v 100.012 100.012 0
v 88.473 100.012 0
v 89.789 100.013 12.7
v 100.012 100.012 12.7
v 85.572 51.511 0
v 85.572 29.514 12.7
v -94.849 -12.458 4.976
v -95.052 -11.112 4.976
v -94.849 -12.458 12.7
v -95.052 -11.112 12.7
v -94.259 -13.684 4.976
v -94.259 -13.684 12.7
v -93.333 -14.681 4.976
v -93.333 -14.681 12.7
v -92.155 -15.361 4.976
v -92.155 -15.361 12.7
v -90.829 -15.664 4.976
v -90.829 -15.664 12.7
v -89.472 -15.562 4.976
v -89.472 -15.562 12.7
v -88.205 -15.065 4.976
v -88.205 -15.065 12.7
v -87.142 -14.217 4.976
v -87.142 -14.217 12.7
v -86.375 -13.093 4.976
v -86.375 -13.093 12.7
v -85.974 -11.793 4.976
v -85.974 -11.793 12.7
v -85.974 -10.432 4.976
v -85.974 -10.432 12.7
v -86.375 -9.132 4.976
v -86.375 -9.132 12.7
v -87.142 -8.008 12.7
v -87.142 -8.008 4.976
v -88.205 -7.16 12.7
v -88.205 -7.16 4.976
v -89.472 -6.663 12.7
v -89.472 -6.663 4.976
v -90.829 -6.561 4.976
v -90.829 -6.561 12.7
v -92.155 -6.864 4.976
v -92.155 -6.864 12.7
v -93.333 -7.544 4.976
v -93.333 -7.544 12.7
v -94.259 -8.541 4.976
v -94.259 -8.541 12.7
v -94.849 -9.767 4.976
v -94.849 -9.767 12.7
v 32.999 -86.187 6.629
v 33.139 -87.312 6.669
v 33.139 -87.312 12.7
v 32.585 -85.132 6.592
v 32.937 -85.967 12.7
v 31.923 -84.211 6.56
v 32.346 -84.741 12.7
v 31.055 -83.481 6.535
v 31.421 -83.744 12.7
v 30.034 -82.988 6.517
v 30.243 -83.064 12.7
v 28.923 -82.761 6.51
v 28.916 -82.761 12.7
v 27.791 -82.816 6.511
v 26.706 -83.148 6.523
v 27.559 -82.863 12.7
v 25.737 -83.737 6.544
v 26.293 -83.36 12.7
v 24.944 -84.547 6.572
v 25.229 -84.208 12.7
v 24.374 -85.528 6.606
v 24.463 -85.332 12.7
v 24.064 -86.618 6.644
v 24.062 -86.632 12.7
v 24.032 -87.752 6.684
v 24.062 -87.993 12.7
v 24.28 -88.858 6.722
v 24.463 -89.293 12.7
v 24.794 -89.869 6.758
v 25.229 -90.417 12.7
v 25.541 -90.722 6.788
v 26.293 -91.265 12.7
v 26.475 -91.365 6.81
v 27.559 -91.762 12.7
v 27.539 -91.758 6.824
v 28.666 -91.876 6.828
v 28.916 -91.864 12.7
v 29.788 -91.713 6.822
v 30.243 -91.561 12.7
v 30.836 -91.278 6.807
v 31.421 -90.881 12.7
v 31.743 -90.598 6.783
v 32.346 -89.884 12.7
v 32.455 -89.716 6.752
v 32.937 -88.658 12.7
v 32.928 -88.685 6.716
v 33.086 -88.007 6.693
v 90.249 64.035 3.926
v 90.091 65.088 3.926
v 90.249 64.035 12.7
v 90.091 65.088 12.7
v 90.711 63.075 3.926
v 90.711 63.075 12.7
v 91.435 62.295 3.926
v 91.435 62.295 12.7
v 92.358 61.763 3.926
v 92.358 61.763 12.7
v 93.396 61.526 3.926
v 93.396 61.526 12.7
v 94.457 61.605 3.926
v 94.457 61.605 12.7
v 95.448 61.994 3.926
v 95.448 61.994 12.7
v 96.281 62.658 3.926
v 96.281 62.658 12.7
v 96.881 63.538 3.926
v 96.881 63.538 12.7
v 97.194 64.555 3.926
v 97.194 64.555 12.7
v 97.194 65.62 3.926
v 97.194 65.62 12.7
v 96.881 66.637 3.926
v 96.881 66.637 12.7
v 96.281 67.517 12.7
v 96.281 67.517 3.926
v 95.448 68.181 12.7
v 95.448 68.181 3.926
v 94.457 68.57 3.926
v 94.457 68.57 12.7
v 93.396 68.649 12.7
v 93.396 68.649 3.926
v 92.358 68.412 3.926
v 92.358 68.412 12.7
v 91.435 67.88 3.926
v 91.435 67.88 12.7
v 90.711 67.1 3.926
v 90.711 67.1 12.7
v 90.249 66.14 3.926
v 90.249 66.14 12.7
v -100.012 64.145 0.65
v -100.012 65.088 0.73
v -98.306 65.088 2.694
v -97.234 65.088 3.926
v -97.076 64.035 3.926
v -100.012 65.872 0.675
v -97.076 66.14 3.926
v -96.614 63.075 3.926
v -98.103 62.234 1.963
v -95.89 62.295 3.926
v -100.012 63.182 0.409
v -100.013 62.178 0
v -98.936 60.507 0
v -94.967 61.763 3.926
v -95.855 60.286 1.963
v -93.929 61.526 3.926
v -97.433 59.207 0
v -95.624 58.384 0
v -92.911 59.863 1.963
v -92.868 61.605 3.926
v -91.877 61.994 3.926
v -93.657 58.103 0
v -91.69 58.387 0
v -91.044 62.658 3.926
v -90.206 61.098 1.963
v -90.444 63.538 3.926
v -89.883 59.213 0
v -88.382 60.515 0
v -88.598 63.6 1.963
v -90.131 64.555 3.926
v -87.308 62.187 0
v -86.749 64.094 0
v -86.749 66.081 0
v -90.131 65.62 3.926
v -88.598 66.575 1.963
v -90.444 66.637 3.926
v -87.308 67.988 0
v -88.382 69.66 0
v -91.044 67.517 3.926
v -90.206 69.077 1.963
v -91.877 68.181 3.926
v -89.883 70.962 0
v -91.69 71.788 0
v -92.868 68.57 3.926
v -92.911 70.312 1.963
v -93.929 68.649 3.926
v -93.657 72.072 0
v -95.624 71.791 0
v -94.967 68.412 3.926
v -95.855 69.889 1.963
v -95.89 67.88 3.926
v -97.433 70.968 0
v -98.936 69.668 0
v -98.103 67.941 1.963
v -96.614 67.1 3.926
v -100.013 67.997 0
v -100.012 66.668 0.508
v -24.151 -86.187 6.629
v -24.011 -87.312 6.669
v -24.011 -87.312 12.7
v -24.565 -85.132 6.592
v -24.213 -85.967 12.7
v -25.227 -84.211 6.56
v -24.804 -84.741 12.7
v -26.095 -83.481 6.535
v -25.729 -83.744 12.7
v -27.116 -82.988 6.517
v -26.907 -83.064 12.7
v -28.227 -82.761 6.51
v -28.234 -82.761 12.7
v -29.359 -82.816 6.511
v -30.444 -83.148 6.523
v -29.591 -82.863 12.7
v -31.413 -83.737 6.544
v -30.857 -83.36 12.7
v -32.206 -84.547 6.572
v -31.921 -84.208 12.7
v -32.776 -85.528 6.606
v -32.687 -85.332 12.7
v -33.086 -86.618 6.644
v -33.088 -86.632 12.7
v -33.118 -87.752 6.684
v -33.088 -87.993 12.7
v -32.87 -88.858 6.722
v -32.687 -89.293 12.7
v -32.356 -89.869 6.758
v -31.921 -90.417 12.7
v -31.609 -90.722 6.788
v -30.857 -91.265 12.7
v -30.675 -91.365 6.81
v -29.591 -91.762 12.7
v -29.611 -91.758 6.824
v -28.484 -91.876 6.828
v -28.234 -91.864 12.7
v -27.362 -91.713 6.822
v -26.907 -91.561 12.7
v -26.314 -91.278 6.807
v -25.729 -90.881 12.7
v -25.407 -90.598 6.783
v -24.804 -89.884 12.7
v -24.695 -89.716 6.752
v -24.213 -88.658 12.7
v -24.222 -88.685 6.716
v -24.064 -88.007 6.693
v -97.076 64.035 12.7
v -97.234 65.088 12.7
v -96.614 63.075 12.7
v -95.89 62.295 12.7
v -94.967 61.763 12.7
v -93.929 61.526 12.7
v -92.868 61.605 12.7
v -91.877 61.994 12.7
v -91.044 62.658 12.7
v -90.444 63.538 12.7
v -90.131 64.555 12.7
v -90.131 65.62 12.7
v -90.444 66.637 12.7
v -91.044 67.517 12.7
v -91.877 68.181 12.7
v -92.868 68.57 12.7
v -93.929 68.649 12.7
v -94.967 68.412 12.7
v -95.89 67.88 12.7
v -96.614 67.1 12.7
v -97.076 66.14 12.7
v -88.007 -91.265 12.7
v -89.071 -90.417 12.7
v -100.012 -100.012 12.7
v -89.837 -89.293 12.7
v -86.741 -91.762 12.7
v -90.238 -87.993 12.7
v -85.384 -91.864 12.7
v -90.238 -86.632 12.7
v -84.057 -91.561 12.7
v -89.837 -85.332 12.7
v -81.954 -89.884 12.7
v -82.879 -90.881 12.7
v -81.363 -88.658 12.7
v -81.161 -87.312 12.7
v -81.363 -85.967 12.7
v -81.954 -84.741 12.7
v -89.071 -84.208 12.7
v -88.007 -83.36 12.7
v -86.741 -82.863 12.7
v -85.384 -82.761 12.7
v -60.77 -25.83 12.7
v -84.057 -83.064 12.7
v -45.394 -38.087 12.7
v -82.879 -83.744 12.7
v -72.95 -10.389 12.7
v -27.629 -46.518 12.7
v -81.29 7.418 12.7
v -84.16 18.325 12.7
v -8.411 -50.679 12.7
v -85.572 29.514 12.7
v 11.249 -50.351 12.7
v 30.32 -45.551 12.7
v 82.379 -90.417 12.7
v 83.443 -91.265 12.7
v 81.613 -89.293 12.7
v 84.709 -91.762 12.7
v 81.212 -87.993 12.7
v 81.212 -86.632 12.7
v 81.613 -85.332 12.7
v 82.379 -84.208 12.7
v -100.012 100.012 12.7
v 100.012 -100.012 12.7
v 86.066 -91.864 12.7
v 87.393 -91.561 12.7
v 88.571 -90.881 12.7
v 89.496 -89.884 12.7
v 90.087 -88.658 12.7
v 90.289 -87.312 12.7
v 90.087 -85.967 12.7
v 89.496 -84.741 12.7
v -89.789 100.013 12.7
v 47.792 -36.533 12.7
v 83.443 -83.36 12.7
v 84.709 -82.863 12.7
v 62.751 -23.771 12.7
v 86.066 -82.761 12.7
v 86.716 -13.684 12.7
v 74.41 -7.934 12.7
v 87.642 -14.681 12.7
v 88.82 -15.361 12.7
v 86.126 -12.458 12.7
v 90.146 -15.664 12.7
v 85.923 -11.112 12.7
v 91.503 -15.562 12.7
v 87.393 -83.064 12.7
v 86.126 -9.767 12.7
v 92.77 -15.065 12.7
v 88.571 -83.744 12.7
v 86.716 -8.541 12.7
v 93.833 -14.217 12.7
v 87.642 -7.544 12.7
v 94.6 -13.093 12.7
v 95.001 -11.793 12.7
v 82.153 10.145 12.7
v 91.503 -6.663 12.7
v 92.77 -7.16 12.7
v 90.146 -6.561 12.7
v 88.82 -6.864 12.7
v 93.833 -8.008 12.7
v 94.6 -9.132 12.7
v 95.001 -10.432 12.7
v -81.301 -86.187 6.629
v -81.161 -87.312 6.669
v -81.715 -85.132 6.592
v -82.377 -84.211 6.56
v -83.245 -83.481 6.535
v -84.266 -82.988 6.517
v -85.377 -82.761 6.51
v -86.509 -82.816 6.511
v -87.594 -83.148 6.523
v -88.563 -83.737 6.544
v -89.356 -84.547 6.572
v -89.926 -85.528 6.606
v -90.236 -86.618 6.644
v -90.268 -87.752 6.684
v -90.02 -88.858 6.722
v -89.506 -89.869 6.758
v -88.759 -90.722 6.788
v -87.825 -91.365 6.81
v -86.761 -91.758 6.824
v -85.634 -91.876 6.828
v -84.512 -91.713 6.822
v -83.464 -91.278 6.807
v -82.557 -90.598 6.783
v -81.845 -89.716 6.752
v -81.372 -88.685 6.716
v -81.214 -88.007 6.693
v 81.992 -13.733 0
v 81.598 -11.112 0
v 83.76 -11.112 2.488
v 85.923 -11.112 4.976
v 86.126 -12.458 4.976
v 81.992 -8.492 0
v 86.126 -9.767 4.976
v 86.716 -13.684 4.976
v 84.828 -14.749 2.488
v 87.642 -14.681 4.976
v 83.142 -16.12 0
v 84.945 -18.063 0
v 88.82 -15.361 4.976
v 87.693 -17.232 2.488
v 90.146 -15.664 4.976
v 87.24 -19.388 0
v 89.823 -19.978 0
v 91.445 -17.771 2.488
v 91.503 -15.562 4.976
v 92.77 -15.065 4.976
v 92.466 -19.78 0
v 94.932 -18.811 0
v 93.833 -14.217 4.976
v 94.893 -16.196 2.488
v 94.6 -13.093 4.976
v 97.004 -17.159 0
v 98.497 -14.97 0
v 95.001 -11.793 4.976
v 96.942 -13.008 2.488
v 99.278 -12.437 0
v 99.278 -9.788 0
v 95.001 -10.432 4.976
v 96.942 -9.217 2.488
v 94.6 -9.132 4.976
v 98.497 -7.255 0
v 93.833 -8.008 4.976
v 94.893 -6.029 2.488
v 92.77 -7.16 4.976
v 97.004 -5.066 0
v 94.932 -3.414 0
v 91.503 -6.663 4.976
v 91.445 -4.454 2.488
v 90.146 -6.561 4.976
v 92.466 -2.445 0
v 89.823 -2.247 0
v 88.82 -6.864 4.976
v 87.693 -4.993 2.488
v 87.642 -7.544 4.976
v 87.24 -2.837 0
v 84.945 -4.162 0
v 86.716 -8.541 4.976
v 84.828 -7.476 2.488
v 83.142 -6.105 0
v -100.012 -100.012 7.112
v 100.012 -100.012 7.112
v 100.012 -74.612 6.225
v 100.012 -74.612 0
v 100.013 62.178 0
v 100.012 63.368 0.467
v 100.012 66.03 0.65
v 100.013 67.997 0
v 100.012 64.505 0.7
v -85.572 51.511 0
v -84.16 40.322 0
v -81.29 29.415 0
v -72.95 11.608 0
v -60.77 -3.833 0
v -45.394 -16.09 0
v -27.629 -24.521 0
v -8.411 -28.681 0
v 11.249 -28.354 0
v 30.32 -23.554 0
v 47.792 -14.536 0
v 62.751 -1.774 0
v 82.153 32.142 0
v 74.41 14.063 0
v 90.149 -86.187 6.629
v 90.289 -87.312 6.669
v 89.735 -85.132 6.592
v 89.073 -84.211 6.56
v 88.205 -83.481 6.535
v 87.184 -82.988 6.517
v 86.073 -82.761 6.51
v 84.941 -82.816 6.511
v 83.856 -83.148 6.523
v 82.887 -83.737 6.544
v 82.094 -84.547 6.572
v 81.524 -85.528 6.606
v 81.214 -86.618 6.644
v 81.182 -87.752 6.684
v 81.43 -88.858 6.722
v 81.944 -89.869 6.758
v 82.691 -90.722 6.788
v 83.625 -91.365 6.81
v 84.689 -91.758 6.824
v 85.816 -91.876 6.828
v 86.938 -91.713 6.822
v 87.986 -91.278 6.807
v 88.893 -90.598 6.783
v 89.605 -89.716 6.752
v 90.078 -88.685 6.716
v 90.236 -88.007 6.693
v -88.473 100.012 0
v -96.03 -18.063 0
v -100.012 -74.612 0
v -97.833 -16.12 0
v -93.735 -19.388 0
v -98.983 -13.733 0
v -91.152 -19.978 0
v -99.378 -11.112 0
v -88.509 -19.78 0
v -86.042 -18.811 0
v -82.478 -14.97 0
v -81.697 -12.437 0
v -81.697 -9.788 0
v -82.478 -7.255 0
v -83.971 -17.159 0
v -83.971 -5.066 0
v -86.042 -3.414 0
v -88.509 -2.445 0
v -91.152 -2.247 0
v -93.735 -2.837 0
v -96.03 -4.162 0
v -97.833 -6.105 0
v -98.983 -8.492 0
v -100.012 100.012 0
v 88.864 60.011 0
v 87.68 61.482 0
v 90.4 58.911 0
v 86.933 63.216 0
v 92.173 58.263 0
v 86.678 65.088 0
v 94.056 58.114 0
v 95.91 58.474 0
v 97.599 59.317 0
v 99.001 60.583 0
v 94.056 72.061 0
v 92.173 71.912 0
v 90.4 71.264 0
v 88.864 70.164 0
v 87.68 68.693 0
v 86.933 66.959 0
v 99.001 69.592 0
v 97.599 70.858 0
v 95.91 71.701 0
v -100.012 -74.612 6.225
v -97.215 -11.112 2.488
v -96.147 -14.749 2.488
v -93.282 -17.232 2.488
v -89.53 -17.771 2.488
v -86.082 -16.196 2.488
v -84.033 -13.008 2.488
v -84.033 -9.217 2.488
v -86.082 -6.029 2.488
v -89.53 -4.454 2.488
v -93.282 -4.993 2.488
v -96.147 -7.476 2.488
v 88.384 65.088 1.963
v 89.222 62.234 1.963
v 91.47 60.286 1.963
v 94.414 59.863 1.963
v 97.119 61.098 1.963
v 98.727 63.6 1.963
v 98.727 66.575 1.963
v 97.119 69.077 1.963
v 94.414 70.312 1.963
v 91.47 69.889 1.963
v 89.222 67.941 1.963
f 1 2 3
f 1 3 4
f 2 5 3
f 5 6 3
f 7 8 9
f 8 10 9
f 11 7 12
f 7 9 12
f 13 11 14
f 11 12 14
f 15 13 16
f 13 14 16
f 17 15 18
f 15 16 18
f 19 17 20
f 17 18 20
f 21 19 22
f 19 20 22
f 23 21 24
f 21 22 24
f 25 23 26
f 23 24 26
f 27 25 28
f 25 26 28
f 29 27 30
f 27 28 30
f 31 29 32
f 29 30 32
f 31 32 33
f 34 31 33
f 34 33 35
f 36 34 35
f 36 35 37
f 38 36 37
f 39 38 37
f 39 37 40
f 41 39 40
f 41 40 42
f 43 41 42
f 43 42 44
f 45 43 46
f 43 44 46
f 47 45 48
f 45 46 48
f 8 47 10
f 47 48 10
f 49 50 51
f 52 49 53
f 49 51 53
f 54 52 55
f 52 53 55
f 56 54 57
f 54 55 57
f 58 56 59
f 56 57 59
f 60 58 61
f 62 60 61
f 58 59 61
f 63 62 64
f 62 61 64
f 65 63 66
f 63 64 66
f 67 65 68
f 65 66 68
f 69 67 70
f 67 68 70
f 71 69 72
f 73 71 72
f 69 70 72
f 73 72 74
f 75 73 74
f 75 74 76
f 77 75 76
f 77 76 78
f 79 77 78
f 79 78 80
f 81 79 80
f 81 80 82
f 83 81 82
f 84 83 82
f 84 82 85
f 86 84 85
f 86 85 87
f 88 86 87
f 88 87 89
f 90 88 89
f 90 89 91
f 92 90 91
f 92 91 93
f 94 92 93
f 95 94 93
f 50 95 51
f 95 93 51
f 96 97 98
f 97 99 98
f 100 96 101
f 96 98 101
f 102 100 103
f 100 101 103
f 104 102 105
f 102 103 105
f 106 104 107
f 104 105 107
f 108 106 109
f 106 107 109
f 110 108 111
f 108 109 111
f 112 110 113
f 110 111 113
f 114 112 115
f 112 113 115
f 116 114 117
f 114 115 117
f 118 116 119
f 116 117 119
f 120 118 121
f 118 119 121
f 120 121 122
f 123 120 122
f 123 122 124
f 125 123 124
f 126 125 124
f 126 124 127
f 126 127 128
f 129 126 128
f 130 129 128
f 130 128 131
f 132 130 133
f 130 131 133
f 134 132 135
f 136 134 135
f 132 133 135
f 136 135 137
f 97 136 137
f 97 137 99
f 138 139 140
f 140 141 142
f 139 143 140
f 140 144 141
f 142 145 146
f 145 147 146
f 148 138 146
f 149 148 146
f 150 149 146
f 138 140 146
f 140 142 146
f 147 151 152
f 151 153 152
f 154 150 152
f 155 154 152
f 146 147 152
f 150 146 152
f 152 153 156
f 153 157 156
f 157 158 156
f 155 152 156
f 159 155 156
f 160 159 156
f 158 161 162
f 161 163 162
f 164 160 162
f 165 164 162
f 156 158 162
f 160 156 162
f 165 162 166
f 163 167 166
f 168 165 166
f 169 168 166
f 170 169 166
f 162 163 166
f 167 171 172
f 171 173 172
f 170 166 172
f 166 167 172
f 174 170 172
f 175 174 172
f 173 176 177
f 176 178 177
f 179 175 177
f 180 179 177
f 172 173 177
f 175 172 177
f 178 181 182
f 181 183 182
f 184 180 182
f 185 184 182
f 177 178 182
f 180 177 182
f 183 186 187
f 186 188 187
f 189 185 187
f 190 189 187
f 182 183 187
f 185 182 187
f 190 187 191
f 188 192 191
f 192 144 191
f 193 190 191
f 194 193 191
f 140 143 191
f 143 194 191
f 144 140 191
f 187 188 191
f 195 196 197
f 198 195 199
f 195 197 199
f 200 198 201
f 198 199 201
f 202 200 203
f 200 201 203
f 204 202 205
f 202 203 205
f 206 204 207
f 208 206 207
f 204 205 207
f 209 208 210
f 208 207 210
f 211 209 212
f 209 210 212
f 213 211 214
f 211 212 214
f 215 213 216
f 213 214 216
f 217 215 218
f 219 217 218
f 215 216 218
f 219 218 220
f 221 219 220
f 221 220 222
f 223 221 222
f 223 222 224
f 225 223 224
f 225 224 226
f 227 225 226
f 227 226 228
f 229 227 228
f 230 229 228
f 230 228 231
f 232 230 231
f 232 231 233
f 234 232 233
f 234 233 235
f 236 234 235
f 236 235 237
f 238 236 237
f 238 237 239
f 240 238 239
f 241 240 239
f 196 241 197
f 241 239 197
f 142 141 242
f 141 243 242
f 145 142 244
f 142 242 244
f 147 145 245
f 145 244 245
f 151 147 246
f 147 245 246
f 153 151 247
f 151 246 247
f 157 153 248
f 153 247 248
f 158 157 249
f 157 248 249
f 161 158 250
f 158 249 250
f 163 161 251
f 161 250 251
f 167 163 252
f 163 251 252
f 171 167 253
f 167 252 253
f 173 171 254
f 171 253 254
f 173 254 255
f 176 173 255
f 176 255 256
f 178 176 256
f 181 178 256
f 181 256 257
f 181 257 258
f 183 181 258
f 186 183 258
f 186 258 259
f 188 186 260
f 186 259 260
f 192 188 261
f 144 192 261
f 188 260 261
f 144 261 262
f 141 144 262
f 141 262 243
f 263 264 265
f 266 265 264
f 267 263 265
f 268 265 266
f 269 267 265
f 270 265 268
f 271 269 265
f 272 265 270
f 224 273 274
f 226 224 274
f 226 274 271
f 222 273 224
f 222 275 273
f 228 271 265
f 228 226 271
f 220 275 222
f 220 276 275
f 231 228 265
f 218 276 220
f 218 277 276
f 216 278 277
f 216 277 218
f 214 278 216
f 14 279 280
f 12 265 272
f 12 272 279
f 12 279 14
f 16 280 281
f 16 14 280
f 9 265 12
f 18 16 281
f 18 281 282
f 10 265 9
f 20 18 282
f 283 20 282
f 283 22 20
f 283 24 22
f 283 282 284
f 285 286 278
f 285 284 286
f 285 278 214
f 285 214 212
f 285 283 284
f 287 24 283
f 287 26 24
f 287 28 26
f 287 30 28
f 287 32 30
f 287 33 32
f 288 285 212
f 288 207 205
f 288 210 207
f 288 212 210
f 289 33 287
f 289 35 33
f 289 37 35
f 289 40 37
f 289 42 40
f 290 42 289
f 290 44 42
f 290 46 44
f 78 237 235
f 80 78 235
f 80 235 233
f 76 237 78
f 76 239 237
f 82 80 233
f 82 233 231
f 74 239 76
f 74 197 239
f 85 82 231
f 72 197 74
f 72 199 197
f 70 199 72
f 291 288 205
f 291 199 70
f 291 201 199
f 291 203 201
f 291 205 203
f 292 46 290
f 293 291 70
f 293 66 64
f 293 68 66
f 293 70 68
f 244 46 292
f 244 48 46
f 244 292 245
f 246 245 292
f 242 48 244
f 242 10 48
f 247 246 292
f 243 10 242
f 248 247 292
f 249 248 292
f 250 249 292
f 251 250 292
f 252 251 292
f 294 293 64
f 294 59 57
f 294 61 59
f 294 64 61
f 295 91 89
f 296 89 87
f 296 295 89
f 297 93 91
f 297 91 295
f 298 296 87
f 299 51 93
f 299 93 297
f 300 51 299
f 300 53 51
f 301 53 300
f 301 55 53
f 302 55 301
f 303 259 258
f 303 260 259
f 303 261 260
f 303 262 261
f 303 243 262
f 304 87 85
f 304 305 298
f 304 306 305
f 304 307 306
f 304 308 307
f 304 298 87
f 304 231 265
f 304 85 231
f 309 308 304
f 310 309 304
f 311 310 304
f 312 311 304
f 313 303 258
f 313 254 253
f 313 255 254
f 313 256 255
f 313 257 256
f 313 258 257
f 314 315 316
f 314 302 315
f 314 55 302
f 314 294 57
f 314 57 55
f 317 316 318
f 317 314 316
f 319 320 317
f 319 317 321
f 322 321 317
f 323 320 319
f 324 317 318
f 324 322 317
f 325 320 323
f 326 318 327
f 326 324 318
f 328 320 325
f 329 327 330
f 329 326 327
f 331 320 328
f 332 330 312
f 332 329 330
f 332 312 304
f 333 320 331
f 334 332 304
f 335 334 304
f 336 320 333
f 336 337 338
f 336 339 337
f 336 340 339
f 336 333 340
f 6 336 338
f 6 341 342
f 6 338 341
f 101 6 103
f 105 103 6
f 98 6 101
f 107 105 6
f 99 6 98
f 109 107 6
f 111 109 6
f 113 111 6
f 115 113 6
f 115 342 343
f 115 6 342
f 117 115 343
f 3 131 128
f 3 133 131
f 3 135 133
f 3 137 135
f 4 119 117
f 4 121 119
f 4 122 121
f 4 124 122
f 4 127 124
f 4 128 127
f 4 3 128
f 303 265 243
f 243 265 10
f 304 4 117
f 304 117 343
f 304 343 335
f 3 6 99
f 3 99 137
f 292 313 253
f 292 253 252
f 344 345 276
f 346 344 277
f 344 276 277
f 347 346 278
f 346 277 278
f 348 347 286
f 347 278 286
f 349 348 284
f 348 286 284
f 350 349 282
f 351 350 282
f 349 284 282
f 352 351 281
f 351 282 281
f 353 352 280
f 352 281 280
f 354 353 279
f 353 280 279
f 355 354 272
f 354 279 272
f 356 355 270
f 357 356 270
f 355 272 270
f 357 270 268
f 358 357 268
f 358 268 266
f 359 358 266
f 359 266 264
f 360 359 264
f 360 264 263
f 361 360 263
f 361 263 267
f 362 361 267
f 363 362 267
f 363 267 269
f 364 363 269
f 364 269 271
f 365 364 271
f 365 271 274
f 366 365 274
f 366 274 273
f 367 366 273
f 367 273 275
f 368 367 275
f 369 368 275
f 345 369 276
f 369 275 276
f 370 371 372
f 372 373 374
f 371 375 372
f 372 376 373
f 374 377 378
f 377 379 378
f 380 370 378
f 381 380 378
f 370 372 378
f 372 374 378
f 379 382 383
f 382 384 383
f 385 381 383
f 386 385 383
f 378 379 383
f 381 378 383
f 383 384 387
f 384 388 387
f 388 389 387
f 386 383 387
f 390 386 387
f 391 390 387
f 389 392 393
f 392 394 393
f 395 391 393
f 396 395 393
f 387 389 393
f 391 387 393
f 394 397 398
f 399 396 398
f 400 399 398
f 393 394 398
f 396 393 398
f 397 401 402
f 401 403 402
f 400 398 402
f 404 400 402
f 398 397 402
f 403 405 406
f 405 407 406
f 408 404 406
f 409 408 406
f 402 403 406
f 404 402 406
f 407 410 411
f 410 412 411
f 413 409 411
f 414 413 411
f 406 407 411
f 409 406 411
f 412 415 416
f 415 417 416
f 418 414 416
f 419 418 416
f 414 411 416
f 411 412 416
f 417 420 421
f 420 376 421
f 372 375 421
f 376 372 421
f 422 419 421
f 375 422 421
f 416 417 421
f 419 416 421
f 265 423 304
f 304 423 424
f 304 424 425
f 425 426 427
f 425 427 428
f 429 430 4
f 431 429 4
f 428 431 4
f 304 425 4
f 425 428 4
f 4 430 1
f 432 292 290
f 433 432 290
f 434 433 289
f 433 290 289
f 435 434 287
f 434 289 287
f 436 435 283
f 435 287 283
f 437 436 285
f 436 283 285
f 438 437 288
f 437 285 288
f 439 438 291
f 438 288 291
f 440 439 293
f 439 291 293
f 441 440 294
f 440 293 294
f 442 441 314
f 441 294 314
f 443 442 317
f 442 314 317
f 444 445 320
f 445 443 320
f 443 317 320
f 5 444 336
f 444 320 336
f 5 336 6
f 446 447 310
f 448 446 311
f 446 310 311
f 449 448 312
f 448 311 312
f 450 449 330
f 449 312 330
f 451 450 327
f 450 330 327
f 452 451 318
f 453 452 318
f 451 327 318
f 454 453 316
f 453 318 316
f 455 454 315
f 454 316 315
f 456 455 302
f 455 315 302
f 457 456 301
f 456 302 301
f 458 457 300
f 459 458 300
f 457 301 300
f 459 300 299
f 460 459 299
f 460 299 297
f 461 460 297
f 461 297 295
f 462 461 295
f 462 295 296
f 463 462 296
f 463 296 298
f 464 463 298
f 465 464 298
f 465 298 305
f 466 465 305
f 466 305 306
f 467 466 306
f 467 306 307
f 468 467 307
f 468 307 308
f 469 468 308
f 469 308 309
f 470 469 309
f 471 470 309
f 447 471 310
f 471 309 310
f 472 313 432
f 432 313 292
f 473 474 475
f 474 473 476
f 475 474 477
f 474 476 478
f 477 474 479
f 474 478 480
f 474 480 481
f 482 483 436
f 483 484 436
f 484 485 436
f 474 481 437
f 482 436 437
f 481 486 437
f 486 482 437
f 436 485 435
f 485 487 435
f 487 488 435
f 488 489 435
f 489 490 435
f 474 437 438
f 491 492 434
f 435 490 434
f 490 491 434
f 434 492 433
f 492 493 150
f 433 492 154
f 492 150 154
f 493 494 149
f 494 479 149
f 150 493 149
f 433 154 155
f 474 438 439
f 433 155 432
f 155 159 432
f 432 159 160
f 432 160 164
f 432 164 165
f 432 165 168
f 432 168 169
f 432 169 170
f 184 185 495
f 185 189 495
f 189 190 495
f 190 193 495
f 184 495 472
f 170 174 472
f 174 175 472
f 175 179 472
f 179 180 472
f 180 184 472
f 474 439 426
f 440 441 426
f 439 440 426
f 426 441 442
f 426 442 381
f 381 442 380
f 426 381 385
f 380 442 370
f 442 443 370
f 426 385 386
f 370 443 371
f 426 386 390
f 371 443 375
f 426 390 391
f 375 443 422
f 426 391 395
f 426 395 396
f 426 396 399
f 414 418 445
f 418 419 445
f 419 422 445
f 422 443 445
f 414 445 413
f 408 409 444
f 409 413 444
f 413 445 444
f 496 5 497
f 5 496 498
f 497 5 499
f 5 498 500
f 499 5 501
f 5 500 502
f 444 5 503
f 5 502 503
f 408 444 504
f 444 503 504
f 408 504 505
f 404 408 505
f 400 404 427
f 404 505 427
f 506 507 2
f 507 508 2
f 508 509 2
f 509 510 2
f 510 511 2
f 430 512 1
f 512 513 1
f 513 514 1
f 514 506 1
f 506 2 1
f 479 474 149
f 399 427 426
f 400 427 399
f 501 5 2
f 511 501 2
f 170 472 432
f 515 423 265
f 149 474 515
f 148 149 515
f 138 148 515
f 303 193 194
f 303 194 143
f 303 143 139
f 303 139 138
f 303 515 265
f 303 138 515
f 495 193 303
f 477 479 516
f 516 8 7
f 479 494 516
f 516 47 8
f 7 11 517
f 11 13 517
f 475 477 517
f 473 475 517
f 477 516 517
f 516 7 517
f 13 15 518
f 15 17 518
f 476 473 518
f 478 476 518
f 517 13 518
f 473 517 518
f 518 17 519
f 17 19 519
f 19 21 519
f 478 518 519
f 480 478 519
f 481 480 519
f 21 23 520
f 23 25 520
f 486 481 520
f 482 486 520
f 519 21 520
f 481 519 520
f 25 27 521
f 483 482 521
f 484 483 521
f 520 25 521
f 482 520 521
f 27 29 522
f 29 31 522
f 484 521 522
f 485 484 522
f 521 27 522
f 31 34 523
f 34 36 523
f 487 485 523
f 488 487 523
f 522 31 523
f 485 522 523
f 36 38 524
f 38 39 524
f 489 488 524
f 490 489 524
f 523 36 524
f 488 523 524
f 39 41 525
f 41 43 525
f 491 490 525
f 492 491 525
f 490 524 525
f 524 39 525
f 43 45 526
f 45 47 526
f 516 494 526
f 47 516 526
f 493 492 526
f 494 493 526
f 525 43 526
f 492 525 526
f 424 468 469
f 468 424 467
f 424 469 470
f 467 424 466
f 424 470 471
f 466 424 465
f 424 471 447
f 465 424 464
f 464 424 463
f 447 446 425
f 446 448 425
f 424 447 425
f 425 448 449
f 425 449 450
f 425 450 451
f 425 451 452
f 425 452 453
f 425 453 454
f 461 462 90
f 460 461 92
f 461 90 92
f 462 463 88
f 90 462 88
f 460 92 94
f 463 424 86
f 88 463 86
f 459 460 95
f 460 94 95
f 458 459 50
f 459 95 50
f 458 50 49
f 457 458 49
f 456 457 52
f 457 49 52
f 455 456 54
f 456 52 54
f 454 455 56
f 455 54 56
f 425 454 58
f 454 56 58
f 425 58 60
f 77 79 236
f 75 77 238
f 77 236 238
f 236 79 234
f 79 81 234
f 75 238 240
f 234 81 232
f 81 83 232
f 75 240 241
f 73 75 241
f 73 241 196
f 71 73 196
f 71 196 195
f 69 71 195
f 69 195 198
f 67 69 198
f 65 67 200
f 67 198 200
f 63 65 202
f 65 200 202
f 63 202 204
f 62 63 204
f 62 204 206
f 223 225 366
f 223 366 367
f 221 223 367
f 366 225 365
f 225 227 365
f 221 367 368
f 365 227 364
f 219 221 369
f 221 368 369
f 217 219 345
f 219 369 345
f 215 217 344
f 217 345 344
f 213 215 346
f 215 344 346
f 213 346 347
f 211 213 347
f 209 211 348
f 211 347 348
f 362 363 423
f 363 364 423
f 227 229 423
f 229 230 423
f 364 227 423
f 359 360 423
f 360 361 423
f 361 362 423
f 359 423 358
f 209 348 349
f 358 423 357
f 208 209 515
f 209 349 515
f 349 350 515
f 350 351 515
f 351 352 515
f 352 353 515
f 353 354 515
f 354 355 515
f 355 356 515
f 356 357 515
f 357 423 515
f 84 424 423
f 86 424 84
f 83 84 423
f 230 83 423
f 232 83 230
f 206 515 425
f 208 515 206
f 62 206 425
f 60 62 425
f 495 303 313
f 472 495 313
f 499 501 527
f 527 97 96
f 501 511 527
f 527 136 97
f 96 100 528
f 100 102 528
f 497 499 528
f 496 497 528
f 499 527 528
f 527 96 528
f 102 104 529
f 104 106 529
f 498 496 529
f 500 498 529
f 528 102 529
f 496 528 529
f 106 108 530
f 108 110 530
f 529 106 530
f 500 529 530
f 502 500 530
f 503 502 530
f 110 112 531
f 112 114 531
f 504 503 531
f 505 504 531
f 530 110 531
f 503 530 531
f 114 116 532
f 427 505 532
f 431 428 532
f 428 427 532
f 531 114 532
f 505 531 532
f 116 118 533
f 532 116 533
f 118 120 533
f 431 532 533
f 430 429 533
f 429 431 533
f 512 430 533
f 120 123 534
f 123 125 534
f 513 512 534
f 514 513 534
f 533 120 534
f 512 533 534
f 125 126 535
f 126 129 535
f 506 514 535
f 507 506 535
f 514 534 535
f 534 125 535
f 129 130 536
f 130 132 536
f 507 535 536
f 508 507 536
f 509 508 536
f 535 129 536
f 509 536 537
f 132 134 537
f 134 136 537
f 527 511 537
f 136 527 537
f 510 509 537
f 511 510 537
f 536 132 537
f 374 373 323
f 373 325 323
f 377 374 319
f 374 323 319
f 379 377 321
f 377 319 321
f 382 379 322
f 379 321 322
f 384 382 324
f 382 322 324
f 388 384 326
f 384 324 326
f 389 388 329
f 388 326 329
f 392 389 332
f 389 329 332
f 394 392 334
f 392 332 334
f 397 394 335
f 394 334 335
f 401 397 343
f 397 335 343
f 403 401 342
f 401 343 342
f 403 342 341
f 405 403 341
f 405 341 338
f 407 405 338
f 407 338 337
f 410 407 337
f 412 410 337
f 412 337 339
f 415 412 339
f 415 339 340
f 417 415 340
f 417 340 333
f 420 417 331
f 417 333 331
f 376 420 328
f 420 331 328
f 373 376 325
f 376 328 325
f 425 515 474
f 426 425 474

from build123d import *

# Parameters (mm, degrees)
F0_W           = 200.025
F0_H           = 200.025
F1_DEPTH       = 12.7
F4_DEPTH       = 230.886
F5_R           = 4.56438
F6_DEPTH       = 25.4
F8_D           = 9.128125
F8_CSINK_D     = 17.78
F8_CSINK_ANGLE = 82
F9_D           = 7.14375
F9_CSINK_D     = 13.97
F9_CSINK_ANGLE = 82


with BuildPart() as f1:
    # F0 (on Top) → F1 (new body)
    with BuildSketch(Plane.XY):
        Rectangle(F0_W, F0_H)
    extrude(amount=F1_DEPTH)

    # F3 (on face) → F4 (cut)
    with BuildSketch(Plane(origin=(-100.0125, 0, 0), x_dir=(0, -1, 0), z_dir=(-1, 0, 0))):
        Polygon((100.0125, 0), (100.0125, 7.112), (74.6125, 6.2250124549), (74.6125, 0), align=None)
    extrude(amount=-F4_DEPTH, mode=Mode.SUBTRACT)

    # F5 (on face) → F6 (cut)
    with BuildSketch(Plane.XY.offset(12.7)):
        with Locations((-85.725, -87.3125)):
            Circle(F5_R)
        with Locations((-28.575, -87.3125)):
            Circle(F5_R)
        with Locations((28.575, -87.3125)):
            Circle(F5_R)
        with Locations((85.725, -87.3125)):
            Circle(F5_R)
    extrude(amount=-F6_DEPTH, mode=Mode.SUBTRACT)

    # F8 (through all)
    with Locations(Plane(origin=(0, 0, 0), x_dir=(1, 0, 0), z_dir=(0, 0, -1))):
        with Locations((90.4875, 11.1125), (-90.4875, 11.1125)):
            CounterSinkHole(F8_D / 2, F8_CSINK_D / 2, counter_sink_angle=F8_CSINK_ANGLE)

    # F9 (through all)
    with Locations(Plane(origin=(0, 0, 0), x_dir=(1, 0, 0), z_dir=(0, 0, -1))):
        with Locations((93.6625, -65.0875), (-93.6625, -65.0875)):
            CounterSinkHole(F9_D / 2, F9_CSINK_D / 2, counter_sink_angle=F9_CSINK_ANGLE)

    # F12: sweep along a path in F11
    with BuildLine(Plane.YZ) as f12_path:
        Line((113.8857394209, -82.55), (-216.0699394209, 107.95))
    # F10 (on face) → F12 (sweep, cut)
    with BuildSketch(Plane.XY.offset(12.7)):
        with BuildLine():
            Line((85.5720480425, 29.5142850698), (89.789, 100.0125))
            Line((89.789, 100.0125), (-89.789, 100.0125))
            Line((-89.789, 100.0125), (-85.5720480425, 29.5142850698))
            ThreePointArc((-85.5720480425, 29.5142850698), (0, -51.0921), (85.5720480425, 29.5142850698))
        make_face()
    sweep(path=f12_path.line, mode=Mode.SUBTRACT)


solid = f1.part
